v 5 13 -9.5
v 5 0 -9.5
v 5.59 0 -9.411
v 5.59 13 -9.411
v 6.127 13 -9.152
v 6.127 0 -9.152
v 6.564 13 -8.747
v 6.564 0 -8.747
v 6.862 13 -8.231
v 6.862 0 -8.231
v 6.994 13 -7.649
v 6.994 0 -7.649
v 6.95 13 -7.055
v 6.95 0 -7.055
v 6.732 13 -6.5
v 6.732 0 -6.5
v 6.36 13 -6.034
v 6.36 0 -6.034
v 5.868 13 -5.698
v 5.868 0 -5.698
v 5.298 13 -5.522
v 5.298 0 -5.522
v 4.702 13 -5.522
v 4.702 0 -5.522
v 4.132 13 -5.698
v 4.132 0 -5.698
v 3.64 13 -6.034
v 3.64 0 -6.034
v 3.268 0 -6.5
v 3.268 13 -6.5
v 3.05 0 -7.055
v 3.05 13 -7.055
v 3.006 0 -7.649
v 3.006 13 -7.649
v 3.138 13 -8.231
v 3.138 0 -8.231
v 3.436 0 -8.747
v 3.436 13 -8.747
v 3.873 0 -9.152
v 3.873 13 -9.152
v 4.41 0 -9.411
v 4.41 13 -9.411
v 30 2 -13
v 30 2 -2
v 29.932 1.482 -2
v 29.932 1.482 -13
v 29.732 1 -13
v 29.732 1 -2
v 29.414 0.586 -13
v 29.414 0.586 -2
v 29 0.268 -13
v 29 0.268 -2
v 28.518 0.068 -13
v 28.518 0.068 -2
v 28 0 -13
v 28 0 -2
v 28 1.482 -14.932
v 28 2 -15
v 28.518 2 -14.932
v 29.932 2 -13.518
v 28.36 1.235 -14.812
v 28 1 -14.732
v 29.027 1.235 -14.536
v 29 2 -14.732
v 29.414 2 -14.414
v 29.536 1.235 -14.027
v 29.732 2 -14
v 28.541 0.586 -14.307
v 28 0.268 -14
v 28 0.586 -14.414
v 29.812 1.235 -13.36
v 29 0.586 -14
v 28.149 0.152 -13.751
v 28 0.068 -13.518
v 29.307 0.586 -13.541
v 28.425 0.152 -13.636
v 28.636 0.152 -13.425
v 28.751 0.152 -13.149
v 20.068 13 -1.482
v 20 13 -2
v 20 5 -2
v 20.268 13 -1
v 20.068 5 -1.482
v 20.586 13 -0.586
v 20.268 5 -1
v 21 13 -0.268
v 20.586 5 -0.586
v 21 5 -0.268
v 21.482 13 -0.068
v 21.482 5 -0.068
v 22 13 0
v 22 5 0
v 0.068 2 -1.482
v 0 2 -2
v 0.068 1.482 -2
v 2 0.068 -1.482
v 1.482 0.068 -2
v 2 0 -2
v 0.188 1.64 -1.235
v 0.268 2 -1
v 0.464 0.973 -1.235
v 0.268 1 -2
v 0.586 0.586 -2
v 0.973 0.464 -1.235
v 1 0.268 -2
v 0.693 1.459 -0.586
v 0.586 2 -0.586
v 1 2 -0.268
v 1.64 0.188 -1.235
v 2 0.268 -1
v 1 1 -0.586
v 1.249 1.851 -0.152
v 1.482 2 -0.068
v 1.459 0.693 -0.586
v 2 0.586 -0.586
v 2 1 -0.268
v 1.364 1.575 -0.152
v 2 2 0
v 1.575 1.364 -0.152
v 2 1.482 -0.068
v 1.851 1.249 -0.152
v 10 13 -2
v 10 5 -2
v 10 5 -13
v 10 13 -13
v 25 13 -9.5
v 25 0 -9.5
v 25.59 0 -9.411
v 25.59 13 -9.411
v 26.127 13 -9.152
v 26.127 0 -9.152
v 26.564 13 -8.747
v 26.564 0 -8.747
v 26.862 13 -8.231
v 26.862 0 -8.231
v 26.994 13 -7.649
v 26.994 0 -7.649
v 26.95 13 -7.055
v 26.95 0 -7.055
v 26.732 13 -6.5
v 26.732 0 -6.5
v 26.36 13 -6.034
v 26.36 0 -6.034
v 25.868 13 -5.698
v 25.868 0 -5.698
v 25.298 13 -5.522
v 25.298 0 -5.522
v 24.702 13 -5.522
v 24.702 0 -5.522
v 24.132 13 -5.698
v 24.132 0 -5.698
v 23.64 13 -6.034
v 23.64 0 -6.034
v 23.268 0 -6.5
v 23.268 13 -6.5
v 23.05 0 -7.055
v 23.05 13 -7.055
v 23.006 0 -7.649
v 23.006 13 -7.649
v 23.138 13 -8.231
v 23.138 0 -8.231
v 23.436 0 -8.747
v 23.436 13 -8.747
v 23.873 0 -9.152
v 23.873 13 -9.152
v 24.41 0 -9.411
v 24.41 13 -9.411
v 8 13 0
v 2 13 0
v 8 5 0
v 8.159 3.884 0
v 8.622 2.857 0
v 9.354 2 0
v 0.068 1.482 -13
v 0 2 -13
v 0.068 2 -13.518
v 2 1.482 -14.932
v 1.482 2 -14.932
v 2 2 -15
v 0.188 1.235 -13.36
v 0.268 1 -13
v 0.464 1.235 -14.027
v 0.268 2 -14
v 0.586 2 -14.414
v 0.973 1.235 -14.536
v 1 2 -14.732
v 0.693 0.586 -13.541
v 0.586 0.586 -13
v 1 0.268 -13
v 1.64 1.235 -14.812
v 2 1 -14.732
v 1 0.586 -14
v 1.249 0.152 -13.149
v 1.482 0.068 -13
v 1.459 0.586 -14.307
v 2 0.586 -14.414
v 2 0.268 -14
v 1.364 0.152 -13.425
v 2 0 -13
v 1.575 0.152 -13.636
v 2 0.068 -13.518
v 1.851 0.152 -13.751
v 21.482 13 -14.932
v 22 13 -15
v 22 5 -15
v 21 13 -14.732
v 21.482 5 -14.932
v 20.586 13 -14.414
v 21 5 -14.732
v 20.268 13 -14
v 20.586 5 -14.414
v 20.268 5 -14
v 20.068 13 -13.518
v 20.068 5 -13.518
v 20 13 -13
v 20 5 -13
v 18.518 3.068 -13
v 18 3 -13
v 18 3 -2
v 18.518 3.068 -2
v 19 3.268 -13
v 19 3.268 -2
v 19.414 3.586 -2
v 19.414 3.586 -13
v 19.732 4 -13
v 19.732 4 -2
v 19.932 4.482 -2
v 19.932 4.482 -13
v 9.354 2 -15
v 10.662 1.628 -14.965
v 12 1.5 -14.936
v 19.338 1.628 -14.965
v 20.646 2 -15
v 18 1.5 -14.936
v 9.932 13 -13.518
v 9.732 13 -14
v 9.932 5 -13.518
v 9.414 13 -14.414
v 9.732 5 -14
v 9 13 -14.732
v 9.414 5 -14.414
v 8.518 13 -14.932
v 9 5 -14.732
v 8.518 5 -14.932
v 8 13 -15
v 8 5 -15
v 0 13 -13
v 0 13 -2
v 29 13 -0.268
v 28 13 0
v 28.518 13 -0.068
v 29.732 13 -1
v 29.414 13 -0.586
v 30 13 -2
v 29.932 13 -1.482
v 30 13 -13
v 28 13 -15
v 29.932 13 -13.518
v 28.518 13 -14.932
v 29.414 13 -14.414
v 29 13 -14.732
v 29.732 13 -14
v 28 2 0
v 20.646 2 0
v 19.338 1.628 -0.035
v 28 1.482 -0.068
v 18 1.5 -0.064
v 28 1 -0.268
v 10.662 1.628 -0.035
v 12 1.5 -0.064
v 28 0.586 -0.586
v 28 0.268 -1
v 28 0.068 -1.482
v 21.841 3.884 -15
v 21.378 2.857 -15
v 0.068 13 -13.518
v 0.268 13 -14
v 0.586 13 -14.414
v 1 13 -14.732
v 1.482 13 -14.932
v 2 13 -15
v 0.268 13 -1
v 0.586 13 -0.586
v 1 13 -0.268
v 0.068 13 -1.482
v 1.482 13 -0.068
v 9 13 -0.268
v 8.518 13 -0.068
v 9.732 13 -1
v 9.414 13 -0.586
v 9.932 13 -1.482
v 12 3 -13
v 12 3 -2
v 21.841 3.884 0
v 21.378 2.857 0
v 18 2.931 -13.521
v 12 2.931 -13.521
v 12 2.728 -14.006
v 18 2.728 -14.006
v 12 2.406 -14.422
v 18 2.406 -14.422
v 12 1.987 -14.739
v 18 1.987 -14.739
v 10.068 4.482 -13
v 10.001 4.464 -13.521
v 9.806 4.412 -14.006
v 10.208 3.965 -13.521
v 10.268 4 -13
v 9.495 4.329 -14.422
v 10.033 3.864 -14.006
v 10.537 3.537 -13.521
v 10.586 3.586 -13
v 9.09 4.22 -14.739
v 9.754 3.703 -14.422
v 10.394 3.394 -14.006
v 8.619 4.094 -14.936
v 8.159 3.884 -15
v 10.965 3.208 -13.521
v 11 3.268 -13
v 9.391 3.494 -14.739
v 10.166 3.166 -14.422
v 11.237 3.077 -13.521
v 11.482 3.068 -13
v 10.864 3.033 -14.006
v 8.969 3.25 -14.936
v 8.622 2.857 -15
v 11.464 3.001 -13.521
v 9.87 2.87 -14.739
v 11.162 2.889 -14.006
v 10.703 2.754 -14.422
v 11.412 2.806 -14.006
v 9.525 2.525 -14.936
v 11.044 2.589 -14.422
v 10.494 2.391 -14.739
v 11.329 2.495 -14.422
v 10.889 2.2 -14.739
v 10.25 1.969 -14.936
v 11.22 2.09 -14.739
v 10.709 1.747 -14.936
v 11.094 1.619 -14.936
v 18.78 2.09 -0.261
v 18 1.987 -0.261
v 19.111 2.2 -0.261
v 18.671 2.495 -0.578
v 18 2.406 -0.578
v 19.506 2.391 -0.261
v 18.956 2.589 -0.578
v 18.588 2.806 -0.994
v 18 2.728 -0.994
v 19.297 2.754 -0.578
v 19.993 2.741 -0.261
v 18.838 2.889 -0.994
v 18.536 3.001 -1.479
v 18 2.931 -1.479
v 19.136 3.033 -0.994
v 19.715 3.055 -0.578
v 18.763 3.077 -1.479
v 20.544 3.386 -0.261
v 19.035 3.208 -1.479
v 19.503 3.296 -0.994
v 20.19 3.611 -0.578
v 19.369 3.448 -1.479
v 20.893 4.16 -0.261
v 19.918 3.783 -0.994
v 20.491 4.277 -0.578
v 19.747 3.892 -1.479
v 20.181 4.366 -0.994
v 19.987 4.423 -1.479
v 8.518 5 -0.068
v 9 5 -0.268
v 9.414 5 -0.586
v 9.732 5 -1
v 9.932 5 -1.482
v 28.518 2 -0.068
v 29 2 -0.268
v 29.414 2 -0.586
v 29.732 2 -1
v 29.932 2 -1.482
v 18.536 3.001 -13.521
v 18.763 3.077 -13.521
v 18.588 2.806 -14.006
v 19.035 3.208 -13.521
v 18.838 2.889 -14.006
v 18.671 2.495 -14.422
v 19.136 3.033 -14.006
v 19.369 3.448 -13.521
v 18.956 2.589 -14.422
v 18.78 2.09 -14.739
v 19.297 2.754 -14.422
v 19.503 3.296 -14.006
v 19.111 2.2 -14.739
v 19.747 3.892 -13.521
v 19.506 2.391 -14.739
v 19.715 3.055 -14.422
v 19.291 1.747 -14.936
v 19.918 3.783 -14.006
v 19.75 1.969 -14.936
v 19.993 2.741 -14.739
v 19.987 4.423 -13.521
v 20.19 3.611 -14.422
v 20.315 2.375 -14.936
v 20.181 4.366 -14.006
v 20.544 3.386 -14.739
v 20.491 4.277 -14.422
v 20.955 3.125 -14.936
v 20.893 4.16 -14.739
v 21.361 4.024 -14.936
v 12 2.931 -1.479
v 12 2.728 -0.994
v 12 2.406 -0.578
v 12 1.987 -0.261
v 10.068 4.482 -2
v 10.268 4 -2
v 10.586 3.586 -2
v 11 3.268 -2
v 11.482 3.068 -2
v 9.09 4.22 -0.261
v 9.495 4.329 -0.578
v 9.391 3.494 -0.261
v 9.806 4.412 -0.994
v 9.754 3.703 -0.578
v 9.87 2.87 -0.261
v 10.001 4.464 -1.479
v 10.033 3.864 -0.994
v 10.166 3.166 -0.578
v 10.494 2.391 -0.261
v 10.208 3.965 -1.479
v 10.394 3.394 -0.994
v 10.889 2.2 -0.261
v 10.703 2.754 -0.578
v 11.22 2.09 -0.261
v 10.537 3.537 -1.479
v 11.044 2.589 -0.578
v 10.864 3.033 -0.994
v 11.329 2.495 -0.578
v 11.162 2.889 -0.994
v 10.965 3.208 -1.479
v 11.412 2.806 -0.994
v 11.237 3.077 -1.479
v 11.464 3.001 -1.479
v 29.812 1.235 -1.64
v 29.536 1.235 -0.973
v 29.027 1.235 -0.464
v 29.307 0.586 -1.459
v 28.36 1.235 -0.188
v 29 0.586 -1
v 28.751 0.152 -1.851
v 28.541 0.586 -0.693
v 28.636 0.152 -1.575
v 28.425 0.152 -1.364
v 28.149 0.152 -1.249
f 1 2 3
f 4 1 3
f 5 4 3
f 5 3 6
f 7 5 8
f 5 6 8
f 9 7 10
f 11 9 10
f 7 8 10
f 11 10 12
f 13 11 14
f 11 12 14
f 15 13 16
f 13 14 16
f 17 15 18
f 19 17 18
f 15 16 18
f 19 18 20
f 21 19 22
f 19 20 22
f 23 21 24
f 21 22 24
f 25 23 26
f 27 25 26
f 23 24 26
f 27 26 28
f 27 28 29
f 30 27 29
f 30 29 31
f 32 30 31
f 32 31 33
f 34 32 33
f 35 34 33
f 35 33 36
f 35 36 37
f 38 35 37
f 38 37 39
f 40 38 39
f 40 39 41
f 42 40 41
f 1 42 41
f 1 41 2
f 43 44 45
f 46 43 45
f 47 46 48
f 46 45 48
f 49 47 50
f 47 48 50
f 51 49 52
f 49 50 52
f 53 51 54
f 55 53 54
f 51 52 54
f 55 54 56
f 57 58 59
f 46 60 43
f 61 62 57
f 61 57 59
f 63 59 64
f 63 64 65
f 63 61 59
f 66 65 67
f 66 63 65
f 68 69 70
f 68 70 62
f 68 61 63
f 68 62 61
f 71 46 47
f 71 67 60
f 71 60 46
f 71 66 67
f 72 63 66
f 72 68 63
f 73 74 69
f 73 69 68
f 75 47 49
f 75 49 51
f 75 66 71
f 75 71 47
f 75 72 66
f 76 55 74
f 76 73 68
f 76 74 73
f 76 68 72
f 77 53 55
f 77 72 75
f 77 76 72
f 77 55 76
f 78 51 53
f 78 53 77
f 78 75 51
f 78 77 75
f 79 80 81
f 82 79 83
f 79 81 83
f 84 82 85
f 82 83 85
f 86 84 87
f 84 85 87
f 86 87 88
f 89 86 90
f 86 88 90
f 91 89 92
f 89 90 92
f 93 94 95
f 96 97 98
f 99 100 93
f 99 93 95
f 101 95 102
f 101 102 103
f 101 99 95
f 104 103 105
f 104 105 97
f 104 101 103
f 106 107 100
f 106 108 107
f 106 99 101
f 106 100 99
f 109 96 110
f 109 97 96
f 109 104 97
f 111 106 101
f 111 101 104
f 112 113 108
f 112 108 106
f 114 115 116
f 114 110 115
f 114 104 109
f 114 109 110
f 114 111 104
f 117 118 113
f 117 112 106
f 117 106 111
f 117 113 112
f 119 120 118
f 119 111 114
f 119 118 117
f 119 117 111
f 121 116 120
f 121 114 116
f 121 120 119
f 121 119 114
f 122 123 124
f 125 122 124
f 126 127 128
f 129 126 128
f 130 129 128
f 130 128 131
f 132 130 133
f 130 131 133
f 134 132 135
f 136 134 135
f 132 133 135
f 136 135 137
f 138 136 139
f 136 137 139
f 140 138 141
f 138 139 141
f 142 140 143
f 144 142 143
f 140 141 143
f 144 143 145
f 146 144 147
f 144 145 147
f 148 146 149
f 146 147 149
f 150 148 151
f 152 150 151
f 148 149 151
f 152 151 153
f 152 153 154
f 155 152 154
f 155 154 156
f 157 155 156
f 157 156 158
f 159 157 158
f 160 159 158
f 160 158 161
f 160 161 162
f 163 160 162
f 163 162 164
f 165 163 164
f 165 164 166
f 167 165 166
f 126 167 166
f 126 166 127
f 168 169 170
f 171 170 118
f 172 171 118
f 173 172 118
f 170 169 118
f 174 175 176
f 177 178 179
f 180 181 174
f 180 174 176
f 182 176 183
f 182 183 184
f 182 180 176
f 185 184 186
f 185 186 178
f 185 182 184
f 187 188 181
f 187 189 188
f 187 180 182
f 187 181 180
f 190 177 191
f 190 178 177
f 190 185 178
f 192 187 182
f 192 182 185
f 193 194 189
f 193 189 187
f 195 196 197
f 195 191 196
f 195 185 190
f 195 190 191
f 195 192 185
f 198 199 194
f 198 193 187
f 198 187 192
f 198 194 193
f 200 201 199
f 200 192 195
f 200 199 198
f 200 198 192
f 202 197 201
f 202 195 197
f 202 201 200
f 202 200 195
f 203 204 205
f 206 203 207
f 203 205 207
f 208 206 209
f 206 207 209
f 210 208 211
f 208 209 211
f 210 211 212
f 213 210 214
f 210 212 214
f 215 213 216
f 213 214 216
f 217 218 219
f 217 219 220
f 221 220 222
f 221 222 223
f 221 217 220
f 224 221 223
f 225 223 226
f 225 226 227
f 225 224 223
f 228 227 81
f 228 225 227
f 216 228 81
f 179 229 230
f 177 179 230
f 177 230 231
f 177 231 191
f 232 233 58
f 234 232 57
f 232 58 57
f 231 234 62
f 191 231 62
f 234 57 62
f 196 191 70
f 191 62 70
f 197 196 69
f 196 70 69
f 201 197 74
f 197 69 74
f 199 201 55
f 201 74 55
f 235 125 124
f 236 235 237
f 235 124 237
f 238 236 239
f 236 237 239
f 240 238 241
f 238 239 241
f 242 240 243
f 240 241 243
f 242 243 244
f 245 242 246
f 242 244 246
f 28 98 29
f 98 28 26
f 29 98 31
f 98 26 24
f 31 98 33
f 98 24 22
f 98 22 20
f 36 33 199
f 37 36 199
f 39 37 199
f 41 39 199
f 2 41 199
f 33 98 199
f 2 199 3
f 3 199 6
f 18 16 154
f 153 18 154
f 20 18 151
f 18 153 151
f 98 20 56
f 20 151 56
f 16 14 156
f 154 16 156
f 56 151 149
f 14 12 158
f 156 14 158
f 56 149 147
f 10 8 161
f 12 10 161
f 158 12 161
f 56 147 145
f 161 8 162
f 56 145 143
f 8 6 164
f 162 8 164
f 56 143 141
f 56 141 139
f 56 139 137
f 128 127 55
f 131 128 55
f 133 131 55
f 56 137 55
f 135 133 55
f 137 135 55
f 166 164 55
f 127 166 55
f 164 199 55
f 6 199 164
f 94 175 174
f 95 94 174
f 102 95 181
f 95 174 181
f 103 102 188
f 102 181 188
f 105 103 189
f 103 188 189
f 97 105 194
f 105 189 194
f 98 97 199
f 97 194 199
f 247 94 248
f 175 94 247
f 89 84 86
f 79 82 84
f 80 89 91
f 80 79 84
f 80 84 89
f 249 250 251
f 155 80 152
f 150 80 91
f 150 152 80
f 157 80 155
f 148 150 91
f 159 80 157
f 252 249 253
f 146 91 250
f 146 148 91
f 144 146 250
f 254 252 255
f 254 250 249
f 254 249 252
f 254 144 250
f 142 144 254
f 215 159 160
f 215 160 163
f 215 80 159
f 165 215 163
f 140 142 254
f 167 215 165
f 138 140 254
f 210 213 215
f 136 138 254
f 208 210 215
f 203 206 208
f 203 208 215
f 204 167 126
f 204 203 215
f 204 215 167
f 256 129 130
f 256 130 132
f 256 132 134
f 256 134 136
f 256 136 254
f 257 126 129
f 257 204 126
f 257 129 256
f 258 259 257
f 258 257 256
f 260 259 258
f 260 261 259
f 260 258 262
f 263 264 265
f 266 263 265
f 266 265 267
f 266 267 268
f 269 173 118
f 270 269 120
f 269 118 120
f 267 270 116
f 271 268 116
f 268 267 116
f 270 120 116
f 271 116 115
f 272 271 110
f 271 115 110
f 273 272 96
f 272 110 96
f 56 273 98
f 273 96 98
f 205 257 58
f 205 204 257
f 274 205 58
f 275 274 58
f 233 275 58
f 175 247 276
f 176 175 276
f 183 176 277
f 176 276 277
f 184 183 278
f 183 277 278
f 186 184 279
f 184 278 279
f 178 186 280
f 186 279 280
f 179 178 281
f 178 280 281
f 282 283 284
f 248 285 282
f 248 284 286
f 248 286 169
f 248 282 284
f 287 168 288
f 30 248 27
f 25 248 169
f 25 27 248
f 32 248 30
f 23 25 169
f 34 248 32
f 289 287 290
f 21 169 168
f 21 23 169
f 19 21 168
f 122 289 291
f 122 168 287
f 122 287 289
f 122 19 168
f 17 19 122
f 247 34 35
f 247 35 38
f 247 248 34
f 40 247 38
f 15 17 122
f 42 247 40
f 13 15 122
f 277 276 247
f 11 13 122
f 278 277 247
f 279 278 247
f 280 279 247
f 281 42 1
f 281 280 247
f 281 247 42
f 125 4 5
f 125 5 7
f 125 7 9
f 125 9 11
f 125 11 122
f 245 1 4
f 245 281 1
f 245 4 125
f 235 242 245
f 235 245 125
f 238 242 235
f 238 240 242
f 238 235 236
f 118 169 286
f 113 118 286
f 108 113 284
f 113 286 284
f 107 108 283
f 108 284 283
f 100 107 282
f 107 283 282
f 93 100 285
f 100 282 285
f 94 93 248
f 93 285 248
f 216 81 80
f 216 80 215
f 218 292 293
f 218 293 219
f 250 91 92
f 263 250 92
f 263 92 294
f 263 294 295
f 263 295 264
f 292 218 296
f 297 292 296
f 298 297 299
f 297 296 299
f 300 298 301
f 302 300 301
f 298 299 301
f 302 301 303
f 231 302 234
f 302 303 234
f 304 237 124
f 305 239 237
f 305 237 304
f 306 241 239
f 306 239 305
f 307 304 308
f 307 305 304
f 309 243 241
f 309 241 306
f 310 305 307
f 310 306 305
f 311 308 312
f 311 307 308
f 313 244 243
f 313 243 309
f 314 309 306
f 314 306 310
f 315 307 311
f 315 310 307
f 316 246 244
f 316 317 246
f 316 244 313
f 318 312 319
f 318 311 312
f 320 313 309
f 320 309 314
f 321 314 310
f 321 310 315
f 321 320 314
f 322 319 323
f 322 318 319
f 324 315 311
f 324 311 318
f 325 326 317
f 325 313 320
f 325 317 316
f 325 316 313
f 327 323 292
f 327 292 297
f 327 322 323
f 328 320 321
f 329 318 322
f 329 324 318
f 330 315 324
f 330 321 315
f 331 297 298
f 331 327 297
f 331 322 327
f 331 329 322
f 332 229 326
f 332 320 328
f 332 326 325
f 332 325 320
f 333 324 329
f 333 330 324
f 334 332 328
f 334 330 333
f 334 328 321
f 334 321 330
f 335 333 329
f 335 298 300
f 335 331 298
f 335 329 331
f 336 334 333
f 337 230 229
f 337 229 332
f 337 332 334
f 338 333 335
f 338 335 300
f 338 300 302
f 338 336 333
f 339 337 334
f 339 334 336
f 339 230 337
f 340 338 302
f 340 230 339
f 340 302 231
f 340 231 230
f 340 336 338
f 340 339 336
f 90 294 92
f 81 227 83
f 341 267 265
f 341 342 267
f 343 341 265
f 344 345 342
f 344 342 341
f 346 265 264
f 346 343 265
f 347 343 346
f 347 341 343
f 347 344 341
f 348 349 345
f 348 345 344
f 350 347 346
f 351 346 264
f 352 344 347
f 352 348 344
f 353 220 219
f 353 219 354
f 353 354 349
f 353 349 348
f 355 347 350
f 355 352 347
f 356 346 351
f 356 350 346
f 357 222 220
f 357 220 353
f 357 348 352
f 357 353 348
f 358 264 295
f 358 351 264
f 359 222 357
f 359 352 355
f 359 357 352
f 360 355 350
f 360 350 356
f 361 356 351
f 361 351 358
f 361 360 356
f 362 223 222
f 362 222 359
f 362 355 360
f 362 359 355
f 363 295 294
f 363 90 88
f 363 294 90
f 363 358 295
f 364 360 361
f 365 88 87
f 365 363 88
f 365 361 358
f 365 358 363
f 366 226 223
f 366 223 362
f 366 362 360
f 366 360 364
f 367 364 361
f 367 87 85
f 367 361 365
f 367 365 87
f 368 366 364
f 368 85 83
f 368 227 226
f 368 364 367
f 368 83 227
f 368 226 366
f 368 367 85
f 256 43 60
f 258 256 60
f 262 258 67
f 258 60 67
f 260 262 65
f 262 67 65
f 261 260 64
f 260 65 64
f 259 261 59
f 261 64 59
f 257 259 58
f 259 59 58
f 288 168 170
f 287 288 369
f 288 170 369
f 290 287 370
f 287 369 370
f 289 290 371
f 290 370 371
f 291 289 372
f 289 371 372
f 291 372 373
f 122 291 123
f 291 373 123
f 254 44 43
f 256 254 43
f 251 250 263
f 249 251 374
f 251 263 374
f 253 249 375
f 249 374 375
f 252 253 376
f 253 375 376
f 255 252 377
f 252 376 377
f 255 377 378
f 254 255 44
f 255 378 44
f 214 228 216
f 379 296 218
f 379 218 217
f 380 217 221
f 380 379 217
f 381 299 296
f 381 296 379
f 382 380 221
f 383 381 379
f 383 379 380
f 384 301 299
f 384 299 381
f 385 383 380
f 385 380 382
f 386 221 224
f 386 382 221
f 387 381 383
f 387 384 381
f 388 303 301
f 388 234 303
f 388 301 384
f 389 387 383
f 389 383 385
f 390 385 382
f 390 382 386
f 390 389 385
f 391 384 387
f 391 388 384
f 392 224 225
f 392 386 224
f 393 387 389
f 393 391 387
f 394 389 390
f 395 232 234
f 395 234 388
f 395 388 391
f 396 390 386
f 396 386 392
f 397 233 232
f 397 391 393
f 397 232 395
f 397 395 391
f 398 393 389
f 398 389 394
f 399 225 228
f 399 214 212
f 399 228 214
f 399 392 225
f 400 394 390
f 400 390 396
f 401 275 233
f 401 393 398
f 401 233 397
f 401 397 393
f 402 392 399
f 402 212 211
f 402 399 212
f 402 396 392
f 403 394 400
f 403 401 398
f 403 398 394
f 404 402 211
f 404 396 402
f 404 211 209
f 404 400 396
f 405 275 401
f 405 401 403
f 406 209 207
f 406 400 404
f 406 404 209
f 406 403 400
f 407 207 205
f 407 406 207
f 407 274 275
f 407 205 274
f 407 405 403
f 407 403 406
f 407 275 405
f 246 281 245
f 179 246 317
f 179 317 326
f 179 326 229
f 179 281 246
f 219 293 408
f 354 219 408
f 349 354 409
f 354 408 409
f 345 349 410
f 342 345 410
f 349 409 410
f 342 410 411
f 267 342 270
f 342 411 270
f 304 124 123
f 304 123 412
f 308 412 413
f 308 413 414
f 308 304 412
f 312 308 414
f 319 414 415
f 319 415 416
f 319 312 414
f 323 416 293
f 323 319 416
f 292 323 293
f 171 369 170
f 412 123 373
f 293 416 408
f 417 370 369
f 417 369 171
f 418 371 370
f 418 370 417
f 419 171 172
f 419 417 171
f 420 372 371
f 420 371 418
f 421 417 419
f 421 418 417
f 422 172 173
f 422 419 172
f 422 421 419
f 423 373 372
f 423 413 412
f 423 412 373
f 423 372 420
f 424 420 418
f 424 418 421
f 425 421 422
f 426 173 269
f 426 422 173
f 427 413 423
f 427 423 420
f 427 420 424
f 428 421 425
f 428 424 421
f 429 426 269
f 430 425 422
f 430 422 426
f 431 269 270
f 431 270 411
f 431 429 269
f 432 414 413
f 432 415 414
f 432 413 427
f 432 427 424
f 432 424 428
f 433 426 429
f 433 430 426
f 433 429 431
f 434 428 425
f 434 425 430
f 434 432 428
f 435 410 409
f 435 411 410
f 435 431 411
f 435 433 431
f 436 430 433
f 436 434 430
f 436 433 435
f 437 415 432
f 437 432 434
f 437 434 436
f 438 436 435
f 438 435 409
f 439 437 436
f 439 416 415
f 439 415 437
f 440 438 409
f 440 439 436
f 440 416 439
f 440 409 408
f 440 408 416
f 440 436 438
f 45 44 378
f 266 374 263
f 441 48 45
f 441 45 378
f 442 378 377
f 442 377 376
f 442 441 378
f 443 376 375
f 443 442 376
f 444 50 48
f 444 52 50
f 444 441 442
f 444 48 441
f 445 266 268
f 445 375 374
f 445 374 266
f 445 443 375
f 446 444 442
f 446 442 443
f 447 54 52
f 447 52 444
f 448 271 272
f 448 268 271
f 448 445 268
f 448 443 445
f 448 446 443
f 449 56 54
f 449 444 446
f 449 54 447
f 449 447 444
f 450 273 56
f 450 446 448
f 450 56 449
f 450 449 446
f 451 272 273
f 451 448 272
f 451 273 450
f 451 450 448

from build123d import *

# Parameters (mm, degrees)
SKETCH1_W           = 30
SKETCH1_H           = 15
BOSS_EXTRUDE1_DEPTH = 3
SKETCH2_W           = 10
SKETCH2_H           = 15
BOSS_EXTRUDE2_DEPTH = 10
SKETCH3_R           = 2
CUT_EXTRUDE1_DEPTH  = 30
FILLET1_R           = 2


with BuildPart() as part:
    # Sketch1 → Boss-Extrude1 (new body)
    with BuildSketch(Plane(origin=(0, 0, 0), x_dir=(1, 0, 0), z_dir=(0, 1, 0))):
        with Locations((15, 7.5)):
            Rectangle(SKETCH1_W, SKETCH1_H)
    extrude(amount=BOSS_EXTRUDE1_DEPTH)

    # Sketch2 → Boss-Extrude2 (add)
    with BuildSketch(Plane(origin=(0, 3, 0), x_dir=(1, 0, 0), z_dir=(0, 1, 0))):
        with Locations((5, 7.5)):
            Rectangle(SKETCH2_W, SKETCH2_H)
        with Locations((25, 7.5)):
            Rectangle(SKETCH2_W, SKETCH2_H)
    extrude(amount=BOSS_EXTRUDE2_DEPTH)

    # Sketch3 → Cut-Extrude1 (cut)
    with BuildSketch(Plane.XZ):
        with Locations(Location((5, -7.5, 0), (0, 0, 270))):
            Circle(SKETCH3_R)
        with Locations(Location((25, -7.5, 0), (0, 0, 270))):
            Circle(SKETCH3_R)
    extrude(amount=-CUT_EXTRUDE1_DEPTH, mode=Mode.SUBTRACT)

    # Fillet1
    # the kernel refuses this fillet: 2 mm, written as the material it adds along each edge
    with BuildSketch(Plane(origin=(10, 3, -15), x_dir=(0, 1, 0), z_dir=(0, 0, 1)), Plane(origin=(20, 3, -15), x_dir=(-1, 0, 0), z_dir=(0, 0, 1))) as fillet1_piece_1:
        with BuildLine():
            CenterArc((FILLET1_R, -FILLET1_R), FILLET1_R, 90, 90)
            Line((0, -FILLET1_R), (0, 0))
            Line((0, 0), (FILLET1_R, 0))
        make_face()
    extrude(amount=15)
    # the kernel refuses this fillet: 2 mm, written as the material it takes off along each edge
    with BuildSketch(Plane(origin=(28, 2, -13), x_dir=(0, 0, -1), z_dir=(0, -1, 0))) as fillet1_2_piece_1_section:
        Polygon((0, 0), (FILLET1_R, 0), (FILLET1_R, FILLET1_R), (0, FILLET1_R), align=None)
    fillet1_2_piece_1 = extrude(amount=FILLET1_R, mode=Mode.PRIVATE)
    fillet1_2_piece_1 = fillet1_2_piece_1 - Plane(origin=(28, 2, -13), x_dir=(-0.7071067811865475, 0, 0.7071067811865475), z_dir=(0, -1, 0)) * Sphere(FILLET1_R, mode=Mode.PRIVATE)
    add(fillet1_2_piece_1, mode=Mode.SUBTRACT)
    with BuildSketch(Plane(origin=(2, 2, -13), x_dir=(0, 0, -1), z_dir=(0, -1, 0))) as fillet1_2_piece_2_section:
        Polygon((0, 0), (FILLET1_R, 0), (FILLET1_R, -FILLET1_R), (0, -FILLET1_R), align=None)
    fillet1_2_piece_2 = extrude(amount=FILLET1_R, mode=Mode.PRIVATE)
    fillet1_2_piece_2 = fillet1_2_piece_2 - Plane(origin=(2, 2, -13), x_dir=(0.7071067811865475, 0, 0.7071067811865475), z_dir=(0, -1, 0)) * Sphere(FILLET1_R, mode=Mode.PRIVATE)
    add(fillet1_2_piece_2, mode=Mode.SUBTRACT)
    with BuildSketch(Plane(origin=(28, 2, -2), x_dir=(0, 0, 1), z_dir=(0, -1, 0))) as fillet1_2_piece_3_section:
        Polygon((0, 0), (FILLET1_R, 0), (FILLET1_R, -FILLET1_R), (0, -FILLET1_R), align=None)
    fillet1_2_piece_3 = extrude(amount=FILLET1_R, mode=Mode.PRIVATE)
    fillet1_2_piece_3 = fillet1_2_piece_3 - Plane(origin=(28, 2, -2), x_dir=(-0.7071067811865475, 0, -0.7071067811865475), z_dir=(0, -1, 0)) * Sphere(FILLET1_R, mode=Mode.PRIVATE)
    add(fillet1_2_piece_3, mode=Mode.SUBTRACT)
    with BuildSketch(Plane(origin=(2, 2, -2), x_dir=(0, -1, 0), z_dir=(0, 0, 1))) as fillet1_2_piece_4_section:
        Polygon((0, 0), (FILLET1_R, 0), (FILLET1_R, -FILLET1_R), (0, -FILLET1_R), align=None)
    fillet1_2_piece_4 = extrude(amount=FILLET1_R, mode=Mode.PRIVATE)
    fillet1_2_piece_4 = fillet1_2_piece_4 - Plane(origin=(2, 2, -2), x_dir=(0.7071067811865475, 0.7071067811865475, 0), z_dir=(0, 0, 1)) * Sphere(FILLET1_R, mode=Mode.PRIVATE)
    add(fillet1_2_piece_4, mode=Mode.SUBTRACT)
    with BuildSketch(Plane(origin=(28, 0, -15), x_dir=(0, 0, 1), z_dir=(-1, 0, 0))) as fillet1_2_piece_5:
        with BuildLine():
            CenterArc((FILLET1_R, FILLET1_R), FILLET1_R, 180, 90)
            Line((0, FILLET1_R), (0, 0))
            Line((0, 0), (FILLET1_R, 0))
        make_face()
    extrude(amount=26, mode=Mode.SUBTRACT)
    with BuildSketch(Plane(origin=(30, 0, -2), x_dir=(0, 1, 0), z_dir=(0, 0, -1)), Plane(origin=(0, 0, -13), x_dir=(0, 1, 0), z_dir=(0, 0, 1))) as fillet1_2_piece_6:
        with BuildLine():
            CenterArc((FILLET1_R, -FILLET1_R), FILLET1_R, 90, 90)
            Line((0, -FILLET1_R), (0, 0))
            Line((0, 0), (FILLET1_R, 0))
        make_face()
    extrude(amount=11, mode=Mode.SUBTRACT)
    with BuildSketch(Plane(origin=(2, 0, 0), x_dir=(0, 1, 0), z_dir=(1, 0, 0))) as fillet1_2_piece_7:
        with BuildLine():
            CenterArc((FILLET1_R, -FILLET1_R), FILLET1_R, 90, 90)
            Line((0, -FILLET1_R), (0, 0))
            Line((0, 0), (FILLET1_R, 0))
        make_face()
    extrude(amount=26, mode=Mode.SUBTRACT)
    with BuildSketch(Plane(origin=(0, 18, -15), x_dir=(0, 0, 1), z_dir=(0, -1, 0)), Plane(origin=(30, 2, -15), x_dir=(0, 0, 1), z_dir=(0, 1, 0)), Plane(origin=(30, 2, 0), x_dir=(-1, 0, 0), z_dir=(0, 1, 0)), Plane(origin=(0, 18, 0), x_dir=(1, 0, 0), z_dir=(0, -1, 0))) as fillet1_2_piece_8:
        with BuildLine():
            CenterArc((FILLET1_R, -FILLET1_R), FILLET1_R, 90, 90)
            Line((0, -FILLET1_R), (0, 0))
            Line((0, 0), (FILLET1_R, 0))
        make_face()
    extrude(amount=16, mode=Mode.SUBTRACT)
    # the kernel refuses this fillet: 2 mm, written as the material it takes off along each edge
    with BuildSketch(Plane(origin=(12, 3, 0), x_dir=(0, -1, 0), z_dir=(1, 0, 0))) as fillet1_3_piece_1:
        with BuildLine():
            CenterArc((FILLET1_R, FILLET1_R), FILLET1_R, 180, 90)
            Line((0, FILLET1_R), (0, 0))
            Line((0, 0), (FILLET1_R, 0))
        make_face()
    extrude(amount=6, mode=Mode.SUBTRACT)
    with BuildSketch(Plane(origin=(10, 5, 0), x_dir=(-1, 0, 0), z_dir=(0, 1, 0)), Plane(origin=(10, 5, -15), x_dir=(0, 0, 1), z_dir=(0, 1, 0))) as fillet1_3_piece_2:
        with BuildLine():
            CenterArc((FILLET1_R, -FILLET1_R), FILLET1_R, 90, 90)
            Line((0, -FILLET1_R), (0, 0))
            Line((0, 0), (FILLET1_R, 0))
        make_face()
    extrude(amount=13, mode=Mode.SUBTRACT)
    with BuildSketch(Plane(origin=(18, 3, -15), x_dir=(0, 0, 1), z_dir=(-1, 0, 0))) as fillet1_3_piece_3:
        with BuildLine():
            CenterArc((FILLET1_R, -FILLET1_R), FILLET1_R, 90, 90)
            Line((0, -FILLET1_R), (0, 0))
            Line((0, 0), (FILLET1_R, 0))
        make_face()
    extrude(amount=6, mode=Mode.SUBTRACT)
    with BuildSketch(Plane(origin=(20, 5, -15), x_dir=(0, 0, 1), z_dir=(0, 1, 0)), Plane(origin=(20, 5, 0), x_dir=(1, 0, 0), z_dir=(0, 1, 0))) as fillet1_3_piece_4:
        with BuildLine():
            CenterArc((FILLET1_R, FILLET1_R), FILLET1_R, 180, 90)
            Line((0, FILLET1_R), (0, 0))
            Line((0, 0), (FILLET1_R, 0))
        make_face()
    extrude(amount=13, mode=Mode.SUBTRACT)
    with BuildSketch(Plane(origin=(18, 5, 0), x_dir=(0, -1, 0), z_dir=(-1, 0, 0))) as fillet1_3_piece_5:
        with BuildLine():
            CenterArc((2 + FILLET1_R, -FILLET1_R), FILLET1_R, 90, 90)
            Line((2, -FILLET1_R), (2, 0))
            Line((2, 0), (2 + FILLET1_R, 0))
        make_face()
    revolve(axis=Axis((18, 5, 0), (0, 0, 1)), revolution_arc=90, mode=Mode.SUBTRACT)
    with BuildSketch(Plane(origin=(18, 5, -15), x_dir=(0, -1, 0), z_dir=(-1, 0, 0))) as fillet1_3_piece_6:
        with BuildLine():
            CenterArc((2 + FILLET1_R, FILLET1_R), FILLET1_R, 180, 90)
            Line((2 + FILLET1_R, 0), (2, 0))
            Line((2, 0), (2, FILLET1_R))
        make_face()
    revolve(axis=Axis((18, 5, -15), (0, 0, 1)), revolution_arc=90, mode=Mode.SUBTRACT)
    with BuildSketch(Plane(origin=(12, 5, -15), x_dir=(-1, 0, 0), z_dir=(0, 1, 0))) as fillet1_3_piece_7:
        with BuildLine():
            CenterArc((2 + FILLET1_R, FILLET1_R), FILLET1_R, 180, 90)
            Line((2 + FILLET1_R, 0), (2, 0))
            Line((2, 0), (2, FILLET1_R))
        make_face()
    revolve(axis=Axis((12, 5, -15), (0, 0, 1)), revolution_arc=90, mode=Mode.SUBTRACT)
    with BuildSketch(Plane(origin=(12, 5, 0), x_dir=(-1, 0, 0), z_dir=(0, 1, 0))) as fillet1_3_piece_8:
        with BuildLine():
            CenterArc((2 + FILLET1_R, -FILLET1_R), FILLET1_R, 90, 90)
            Line((2, -FILLET1_R), (2, 0))
            Line((2, 0), (2 + FILLET1_R, 0))
        make_face()
    revolve(axis=Axis((12, 5, 0), (0, 0, 1)), revolution_arc=90, mode=Mode.SUBTRACT)


solid = part.part
